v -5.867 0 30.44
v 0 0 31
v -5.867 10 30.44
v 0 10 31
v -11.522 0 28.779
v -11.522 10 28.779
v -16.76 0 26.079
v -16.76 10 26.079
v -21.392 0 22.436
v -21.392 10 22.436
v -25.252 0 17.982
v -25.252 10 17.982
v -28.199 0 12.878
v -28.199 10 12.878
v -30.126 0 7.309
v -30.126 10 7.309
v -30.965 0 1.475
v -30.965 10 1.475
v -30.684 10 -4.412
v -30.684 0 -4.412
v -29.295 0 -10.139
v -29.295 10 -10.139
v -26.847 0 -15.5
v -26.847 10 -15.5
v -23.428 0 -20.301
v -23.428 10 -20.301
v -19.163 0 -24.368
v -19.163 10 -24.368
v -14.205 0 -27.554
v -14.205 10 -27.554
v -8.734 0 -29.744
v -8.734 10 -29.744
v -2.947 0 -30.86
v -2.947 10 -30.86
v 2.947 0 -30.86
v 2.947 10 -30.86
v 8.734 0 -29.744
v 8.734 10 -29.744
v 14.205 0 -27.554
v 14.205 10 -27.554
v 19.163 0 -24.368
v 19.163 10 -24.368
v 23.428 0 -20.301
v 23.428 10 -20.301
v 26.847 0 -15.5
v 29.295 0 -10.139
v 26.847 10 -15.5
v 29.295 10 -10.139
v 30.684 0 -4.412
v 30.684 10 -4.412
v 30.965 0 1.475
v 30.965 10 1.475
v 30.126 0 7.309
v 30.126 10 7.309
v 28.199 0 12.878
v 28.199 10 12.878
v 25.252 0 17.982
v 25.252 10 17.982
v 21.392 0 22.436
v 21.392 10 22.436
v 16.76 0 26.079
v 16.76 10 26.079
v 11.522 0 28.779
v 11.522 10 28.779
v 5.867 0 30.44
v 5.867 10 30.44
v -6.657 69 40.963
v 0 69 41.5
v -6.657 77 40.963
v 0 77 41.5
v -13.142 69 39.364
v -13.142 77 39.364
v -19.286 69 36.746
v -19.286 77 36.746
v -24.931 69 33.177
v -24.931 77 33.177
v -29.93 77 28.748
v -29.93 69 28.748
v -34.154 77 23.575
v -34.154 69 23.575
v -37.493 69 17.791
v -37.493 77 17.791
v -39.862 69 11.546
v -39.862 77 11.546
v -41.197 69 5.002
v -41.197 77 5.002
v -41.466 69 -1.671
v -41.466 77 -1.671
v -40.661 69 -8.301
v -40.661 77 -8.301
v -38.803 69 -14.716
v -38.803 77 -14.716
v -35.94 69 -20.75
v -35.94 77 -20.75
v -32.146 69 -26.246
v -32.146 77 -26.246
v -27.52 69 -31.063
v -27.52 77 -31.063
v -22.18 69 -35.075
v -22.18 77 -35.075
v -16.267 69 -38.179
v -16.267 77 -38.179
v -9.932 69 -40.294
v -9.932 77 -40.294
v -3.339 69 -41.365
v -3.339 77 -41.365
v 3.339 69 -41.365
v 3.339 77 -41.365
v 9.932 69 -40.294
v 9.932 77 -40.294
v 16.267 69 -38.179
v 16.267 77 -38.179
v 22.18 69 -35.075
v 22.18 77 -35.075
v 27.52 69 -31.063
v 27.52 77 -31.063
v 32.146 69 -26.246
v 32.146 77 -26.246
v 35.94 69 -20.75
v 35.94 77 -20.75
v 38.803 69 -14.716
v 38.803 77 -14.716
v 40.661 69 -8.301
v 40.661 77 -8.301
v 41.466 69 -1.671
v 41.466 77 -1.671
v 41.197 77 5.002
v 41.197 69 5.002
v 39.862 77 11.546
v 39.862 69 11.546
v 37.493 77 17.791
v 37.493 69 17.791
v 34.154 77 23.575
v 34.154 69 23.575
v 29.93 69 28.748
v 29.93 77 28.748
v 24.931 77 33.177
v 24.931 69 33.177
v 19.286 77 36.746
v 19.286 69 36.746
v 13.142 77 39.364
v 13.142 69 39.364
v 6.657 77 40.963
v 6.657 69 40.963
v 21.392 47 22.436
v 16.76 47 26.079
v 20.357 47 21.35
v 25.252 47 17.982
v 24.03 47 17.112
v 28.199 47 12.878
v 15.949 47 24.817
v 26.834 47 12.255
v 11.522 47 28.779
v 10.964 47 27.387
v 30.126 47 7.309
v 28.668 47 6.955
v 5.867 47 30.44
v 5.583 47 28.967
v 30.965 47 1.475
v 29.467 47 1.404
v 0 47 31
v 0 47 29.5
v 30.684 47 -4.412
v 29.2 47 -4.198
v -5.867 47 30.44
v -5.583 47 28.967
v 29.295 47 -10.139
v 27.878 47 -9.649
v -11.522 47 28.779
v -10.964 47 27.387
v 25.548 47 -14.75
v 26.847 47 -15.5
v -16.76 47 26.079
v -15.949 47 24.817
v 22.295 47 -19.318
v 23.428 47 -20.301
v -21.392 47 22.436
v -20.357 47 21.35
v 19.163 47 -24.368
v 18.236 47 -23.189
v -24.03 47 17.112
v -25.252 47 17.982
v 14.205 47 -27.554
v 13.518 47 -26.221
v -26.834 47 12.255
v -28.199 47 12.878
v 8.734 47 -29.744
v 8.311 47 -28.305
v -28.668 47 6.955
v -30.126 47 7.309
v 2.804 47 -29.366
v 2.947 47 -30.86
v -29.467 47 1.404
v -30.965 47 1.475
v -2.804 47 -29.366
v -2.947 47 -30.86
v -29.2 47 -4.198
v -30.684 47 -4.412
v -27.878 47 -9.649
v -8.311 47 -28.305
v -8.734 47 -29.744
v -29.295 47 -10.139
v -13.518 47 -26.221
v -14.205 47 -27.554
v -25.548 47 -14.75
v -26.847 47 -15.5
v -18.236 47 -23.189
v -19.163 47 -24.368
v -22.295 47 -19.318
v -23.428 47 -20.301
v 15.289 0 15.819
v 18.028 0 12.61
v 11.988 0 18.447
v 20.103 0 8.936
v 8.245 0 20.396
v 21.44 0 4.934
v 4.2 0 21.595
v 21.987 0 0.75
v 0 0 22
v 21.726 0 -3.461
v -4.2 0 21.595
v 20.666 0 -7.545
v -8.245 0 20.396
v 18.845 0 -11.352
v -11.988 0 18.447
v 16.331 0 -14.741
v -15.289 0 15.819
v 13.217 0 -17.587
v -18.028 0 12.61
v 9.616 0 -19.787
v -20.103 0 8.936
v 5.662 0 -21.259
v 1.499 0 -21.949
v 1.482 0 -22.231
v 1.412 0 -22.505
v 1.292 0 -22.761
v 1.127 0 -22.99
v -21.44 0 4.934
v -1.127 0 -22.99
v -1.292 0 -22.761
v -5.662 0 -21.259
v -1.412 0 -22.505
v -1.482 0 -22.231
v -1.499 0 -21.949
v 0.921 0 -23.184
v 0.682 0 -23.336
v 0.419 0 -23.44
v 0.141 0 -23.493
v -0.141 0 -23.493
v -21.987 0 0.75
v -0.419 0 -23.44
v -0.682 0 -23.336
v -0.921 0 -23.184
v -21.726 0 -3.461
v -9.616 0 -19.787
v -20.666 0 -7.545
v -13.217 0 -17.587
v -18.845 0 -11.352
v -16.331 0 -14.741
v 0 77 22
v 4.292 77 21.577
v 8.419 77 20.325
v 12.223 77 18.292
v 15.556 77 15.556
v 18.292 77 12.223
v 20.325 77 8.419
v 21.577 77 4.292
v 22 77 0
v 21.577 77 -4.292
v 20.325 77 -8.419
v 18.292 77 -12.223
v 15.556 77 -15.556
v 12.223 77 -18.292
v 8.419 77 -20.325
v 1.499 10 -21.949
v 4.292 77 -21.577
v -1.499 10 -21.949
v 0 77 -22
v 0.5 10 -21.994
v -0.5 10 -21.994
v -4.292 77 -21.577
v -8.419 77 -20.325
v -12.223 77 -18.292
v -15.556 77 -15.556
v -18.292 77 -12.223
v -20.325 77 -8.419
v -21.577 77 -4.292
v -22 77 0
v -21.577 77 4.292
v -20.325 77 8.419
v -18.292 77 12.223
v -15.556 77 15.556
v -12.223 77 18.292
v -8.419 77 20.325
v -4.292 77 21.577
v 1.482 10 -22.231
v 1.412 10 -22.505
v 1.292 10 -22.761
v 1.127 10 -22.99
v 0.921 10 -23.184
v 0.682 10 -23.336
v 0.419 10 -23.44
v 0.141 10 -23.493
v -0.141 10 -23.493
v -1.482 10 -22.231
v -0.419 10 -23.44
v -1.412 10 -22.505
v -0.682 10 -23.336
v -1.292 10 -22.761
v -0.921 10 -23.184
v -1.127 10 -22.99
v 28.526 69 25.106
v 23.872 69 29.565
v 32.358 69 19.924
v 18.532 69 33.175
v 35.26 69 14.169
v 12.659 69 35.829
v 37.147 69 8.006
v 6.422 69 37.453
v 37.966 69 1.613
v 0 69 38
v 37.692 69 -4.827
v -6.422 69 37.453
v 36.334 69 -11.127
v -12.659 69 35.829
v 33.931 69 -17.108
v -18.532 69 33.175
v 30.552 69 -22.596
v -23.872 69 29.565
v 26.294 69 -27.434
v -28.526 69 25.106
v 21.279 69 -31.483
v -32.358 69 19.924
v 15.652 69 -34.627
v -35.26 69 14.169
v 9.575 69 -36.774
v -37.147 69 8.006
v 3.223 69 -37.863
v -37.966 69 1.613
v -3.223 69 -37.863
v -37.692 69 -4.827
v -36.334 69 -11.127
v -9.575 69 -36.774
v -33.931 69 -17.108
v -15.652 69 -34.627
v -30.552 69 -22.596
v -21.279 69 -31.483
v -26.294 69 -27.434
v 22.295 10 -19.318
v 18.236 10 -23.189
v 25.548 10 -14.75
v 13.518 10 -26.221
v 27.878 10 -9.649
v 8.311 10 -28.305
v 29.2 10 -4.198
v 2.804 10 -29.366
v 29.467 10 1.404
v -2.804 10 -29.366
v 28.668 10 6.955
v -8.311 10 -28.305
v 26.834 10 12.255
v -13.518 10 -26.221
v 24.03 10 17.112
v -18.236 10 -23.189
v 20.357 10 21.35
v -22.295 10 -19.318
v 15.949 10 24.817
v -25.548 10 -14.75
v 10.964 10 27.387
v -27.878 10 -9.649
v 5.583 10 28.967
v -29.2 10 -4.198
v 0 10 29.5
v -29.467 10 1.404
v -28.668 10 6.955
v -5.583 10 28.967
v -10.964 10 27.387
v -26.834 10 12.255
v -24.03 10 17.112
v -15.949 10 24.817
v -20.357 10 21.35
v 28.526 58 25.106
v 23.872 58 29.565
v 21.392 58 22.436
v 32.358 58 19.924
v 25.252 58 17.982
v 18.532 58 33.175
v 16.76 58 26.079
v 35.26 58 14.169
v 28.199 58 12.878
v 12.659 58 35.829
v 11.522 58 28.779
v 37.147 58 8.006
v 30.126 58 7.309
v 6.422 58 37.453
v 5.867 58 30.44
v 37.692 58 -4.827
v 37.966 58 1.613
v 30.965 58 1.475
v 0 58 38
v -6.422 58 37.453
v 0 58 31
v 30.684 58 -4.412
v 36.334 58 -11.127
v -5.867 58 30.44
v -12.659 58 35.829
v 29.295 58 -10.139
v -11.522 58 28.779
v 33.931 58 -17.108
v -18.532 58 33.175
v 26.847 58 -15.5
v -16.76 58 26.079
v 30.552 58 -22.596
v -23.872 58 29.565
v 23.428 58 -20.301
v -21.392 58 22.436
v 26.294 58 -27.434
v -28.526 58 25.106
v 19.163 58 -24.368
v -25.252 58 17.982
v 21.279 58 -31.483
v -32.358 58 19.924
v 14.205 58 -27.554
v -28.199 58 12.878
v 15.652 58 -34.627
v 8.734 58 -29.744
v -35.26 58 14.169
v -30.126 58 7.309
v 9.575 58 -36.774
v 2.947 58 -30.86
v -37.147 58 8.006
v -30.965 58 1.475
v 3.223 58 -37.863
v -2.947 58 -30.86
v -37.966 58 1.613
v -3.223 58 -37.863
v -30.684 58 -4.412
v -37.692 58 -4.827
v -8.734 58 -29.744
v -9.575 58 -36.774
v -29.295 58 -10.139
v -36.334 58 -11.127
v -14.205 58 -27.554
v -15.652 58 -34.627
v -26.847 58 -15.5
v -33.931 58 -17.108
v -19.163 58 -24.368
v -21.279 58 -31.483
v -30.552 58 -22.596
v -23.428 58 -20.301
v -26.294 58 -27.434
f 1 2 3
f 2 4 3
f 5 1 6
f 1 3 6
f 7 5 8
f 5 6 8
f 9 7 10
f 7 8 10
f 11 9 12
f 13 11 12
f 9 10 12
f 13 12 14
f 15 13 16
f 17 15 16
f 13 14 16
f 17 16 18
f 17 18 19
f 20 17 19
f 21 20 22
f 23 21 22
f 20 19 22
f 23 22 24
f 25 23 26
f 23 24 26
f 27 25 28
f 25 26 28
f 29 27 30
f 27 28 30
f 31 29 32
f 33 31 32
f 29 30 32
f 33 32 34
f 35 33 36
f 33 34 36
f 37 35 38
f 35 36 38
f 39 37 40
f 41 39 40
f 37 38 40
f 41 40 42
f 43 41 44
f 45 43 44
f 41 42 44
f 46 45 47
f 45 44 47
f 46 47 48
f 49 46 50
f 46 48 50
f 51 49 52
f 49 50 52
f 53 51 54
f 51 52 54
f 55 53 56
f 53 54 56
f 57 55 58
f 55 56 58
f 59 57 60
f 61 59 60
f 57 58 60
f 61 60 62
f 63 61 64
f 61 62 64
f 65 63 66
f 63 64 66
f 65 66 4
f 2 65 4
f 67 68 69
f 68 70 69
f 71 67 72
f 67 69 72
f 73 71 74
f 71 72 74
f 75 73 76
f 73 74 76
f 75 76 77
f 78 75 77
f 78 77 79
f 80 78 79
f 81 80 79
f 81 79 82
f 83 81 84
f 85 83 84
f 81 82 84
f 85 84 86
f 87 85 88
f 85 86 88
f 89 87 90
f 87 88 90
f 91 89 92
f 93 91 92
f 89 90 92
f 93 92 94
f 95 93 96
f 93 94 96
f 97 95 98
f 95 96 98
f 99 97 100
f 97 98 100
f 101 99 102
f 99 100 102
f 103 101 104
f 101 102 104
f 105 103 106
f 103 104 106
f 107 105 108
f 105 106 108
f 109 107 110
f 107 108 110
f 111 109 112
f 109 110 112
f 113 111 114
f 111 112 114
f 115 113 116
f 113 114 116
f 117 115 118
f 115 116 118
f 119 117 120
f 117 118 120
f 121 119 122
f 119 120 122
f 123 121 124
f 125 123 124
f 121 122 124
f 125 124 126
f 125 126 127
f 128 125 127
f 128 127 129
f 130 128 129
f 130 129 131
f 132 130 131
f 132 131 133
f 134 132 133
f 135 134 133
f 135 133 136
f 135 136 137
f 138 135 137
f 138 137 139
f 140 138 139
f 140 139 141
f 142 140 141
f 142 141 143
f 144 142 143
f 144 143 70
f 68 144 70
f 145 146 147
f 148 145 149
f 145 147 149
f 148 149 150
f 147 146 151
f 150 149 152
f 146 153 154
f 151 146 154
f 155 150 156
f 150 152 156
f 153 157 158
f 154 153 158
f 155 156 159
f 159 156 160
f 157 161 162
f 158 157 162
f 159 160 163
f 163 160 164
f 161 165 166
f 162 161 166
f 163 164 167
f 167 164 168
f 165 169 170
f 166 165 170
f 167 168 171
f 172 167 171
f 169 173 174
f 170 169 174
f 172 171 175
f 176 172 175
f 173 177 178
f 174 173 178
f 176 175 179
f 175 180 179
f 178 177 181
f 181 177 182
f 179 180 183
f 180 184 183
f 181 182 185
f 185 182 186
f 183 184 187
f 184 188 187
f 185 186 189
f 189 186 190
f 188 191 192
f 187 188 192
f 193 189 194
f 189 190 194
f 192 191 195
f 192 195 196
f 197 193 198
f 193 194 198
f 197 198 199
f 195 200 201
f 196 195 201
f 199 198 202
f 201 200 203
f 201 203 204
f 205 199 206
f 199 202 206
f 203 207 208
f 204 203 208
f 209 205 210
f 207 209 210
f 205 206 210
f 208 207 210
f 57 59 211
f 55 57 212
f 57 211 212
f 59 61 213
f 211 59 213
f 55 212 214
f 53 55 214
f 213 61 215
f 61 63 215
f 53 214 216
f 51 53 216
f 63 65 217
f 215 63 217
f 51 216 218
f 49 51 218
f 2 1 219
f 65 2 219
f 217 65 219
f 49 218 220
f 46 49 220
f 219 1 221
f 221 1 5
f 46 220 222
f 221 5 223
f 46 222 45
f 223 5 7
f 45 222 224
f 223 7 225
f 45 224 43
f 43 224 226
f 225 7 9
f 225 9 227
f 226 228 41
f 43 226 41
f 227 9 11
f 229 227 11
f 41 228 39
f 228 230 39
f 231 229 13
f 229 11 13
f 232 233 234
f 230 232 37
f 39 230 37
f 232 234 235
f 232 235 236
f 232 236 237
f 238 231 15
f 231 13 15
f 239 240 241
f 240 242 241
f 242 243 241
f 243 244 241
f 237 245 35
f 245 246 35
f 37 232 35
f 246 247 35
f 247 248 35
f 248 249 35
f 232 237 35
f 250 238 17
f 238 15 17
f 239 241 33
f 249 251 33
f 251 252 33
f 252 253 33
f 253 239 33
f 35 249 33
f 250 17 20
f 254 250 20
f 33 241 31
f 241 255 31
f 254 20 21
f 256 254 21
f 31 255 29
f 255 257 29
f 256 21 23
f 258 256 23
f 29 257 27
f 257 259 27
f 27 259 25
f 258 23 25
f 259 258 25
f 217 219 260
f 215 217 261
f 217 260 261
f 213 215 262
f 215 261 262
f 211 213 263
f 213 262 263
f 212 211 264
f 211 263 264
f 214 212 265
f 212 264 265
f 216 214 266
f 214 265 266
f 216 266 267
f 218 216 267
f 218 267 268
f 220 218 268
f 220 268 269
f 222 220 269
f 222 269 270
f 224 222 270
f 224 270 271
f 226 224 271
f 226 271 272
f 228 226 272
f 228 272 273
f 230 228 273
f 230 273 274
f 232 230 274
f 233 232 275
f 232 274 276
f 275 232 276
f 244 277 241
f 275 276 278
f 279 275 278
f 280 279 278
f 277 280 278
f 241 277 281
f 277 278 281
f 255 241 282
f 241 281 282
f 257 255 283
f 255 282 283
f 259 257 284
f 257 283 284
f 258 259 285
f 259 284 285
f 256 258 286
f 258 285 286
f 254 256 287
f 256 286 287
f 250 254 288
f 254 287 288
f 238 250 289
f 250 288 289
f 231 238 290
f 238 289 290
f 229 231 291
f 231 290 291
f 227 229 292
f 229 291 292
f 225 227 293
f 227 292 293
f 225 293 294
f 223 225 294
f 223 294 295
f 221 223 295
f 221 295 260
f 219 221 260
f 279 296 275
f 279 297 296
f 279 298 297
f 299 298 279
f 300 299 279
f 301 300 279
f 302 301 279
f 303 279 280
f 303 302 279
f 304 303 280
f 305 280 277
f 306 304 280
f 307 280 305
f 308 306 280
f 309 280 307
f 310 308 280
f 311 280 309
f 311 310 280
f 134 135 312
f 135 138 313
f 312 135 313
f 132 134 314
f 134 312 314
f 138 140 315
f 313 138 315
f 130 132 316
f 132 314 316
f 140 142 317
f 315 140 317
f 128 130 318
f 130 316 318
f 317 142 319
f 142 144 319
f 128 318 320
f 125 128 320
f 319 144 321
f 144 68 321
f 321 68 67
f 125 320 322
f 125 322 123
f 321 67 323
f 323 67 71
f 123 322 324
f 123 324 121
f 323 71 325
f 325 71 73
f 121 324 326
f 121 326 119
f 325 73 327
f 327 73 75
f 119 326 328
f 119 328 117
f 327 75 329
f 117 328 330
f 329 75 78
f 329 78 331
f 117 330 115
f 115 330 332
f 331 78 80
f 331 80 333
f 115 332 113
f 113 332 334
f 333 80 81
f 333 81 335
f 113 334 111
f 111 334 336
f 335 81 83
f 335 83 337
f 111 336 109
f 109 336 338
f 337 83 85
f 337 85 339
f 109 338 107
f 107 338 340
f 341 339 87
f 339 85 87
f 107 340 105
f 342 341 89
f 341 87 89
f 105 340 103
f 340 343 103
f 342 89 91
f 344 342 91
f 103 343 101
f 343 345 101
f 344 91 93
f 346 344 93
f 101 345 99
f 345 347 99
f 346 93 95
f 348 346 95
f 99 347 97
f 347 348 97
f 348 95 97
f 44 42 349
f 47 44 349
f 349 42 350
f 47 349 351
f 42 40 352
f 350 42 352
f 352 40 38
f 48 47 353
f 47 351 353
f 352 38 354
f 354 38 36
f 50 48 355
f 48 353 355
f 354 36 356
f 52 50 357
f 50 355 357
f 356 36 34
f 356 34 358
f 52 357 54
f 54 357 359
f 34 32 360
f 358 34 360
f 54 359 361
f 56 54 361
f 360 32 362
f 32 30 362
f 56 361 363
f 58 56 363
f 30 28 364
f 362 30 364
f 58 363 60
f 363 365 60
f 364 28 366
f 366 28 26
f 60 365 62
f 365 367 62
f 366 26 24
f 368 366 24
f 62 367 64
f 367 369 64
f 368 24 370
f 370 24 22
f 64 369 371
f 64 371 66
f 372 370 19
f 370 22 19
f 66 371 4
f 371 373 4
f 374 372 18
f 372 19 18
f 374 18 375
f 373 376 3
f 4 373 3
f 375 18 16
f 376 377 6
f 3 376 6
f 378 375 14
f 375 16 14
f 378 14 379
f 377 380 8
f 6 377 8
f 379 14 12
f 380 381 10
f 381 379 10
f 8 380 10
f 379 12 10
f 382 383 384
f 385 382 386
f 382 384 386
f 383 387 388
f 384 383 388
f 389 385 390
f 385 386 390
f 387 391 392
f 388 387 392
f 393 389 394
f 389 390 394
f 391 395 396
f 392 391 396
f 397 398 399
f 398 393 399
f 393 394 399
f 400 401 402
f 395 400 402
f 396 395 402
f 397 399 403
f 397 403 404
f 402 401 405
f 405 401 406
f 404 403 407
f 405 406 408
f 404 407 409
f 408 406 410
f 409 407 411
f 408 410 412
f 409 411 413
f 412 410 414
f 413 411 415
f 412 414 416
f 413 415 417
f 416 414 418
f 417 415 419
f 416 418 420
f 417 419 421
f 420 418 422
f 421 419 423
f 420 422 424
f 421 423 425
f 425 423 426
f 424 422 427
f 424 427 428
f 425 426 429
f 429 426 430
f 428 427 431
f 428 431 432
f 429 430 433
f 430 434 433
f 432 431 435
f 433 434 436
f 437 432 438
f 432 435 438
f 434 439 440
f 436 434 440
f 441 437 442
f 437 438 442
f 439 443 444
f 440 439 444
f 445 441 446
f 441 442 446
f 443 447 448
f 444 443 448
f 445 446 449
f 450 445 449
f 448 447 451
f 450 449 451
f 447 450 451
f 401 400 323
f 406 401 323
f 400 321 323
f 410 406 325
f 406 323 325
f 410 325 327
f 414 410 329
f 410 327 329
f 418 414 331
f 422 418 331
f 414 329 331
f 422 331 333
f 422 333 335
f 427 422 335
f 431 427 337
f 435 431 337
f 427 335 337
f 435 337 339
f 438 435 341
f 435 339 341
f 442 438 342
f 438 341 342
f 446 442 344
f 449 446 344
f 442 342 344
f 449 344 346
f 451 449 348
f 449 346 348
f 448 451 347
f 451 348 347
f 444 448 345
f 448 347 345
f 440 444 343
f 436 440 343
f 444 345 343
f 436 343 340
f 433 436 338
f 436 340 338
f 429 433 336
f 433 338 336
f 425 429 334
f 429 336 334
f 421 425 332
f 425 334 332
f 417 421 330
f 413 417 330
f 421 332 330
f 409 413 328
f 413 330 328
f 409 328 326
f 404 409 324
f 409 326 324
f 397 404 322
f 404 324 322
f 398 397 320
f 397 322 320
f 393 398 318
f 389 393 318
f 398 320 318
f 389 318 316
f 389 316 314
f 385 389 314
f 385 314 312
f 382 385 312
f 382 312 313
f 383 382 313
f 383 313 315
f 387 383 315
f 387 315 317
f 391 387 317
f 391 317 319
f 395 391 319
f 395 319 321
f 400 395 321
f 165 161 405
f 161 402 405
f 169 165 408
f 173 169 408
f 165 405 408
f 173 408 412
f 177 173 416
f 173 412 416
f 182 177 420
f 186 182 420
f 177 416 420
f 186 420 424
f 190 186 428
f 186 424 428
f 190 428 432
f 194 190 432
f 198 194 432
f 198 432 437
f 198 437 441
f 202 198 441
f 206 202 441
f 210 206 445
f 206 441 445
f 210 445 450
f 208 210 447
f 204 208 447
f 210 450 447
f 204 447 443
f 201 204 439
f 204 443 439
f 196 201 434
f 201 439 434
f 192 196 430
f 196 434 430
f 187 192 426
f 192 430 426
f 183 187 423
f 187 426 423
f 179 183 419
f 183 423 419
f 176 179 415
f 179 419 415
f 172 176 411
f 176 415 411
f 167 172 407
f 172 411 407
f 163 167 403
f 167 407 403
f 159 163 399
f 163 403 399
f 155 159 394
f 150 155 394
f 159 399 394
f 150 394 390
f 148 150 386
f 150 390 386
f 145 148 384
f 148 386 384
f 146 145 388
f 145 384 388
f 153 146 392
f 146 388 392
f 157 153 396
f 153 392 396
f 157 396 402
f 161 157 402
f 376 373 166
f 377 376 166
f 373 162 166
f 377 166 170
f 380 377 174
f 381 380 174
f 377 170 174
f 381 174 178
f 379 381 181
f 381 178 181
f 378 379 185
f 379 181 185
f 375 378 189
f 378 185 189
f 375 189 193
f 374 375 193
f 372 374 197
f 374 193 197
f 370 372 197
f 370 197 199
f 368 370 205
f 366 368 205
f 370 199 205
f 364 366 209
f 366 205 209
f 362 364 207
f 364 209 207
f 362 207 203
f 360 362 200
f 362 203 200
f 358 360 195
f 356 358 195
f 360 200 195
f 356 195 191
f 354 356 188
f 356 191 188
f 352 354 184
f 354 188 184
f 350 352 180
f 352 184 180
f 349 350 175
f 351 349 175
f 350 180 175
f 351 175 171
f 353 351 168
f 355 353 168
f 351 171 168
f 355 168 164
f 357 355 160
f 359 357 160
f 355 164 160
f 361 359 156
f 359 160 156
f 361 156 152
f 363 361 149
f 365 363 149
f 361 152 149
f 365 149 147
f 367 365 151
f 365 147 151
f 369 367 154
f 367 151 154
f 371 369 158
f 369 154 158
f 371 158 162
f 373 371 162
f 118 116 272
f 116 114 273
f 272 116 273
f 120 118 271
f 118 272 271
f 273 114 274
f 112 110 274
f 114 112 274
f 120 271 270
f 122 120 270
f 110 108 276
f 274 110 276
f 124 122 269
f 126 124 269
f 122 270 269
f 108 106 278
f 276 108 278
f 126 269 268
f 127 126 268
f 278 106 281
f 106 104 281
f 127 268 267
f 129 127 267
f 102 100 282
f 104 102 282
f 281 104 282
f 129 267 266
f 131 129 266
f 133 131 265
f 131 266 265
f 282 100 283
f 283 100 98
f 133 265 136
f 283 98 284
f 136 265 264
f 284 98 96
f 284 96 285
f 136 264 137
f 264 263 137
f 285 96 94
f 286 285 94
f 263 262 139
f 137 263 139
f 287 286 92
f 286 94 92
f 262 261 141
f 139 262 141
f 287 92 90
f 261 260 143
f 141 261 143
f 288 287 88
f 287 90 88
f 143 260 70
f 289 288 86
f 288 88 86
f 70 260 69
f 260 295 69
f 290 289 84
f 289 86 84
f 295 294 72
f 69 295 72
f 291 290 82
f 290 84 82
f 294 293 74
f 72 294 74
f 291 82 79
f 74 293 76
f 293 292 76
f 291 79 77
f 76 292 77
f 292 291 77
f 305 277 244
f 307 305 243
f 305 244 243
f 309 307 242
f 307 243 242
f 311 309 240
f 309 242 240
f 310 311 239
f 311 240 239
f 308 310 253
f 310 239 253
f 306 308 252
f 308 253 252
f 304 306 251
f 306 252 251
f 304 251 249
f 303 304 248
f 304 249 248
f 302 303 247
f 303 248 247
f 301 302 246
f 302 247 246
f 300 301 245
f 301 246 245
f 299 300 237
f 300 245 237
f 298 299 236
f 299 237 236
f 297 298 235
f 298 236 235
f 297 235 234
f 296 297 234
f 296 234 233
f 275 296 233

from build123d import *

# Parameters (mm, degrees)
SKETCH4_R          = 22
CUT_EXTRUDE1_DEPTH = 78
SKETCH5_R          = 1.5
CUT_EXTRUDE2_DEPTH = 10


with BuildPart() as part:
    # Sketch3 → Revolve1 (revolve)
    with BuildSketch(Plane.XY, mode=Mode.PRIVATE) as revolve1_sk:
        Polygon((0, 0), (31, 0), (31, 10), (29.5, 10), (29.5, 47), (31, 47), (31, 58), (38, 58), (38, 69), (41.5, 69), (41.5, 77), (0, 77), align=None)
    revolve(revolve1_sk.sketch.rotate(Axis((0, 98.317518248, 0), (0, -1, 0)), 90), axis=Axis((0, 98.317518248, 0), (0, -1, 0)))  # turned: the seam where the file's is

    # Sketch4 → Cut-Extrude1 (cut, through all)
    with BuildSketch(Plane(origin=(0, 77, 0), x_dir=(1, 0, 0), z_dir=(0, 1, 0))):
        with Locations(Location((0, 0, 0), (0, 0, 270))):  # turned: the seam where the file's is
            Circle(SKETCH4_R)
    extrude(amount=-CUT_EXTRUDE1_DEPTH, mode=Mode.SUBTRACT)

    # Sketch5 → Cut-Extrude2 (cut)
    with BuildSketch(Plane(origin=(0, 0, 0), x_dir=(-1, 0, 0), z_dir=(0, -1, 0))):
        with Locations((0, 22)):
            Circle(SKETCH5_R)
    extrude(amount=-CUT_EXTRUDE2_DEPTH, mode=Mode.SUBTRACT)


solid = part.part
